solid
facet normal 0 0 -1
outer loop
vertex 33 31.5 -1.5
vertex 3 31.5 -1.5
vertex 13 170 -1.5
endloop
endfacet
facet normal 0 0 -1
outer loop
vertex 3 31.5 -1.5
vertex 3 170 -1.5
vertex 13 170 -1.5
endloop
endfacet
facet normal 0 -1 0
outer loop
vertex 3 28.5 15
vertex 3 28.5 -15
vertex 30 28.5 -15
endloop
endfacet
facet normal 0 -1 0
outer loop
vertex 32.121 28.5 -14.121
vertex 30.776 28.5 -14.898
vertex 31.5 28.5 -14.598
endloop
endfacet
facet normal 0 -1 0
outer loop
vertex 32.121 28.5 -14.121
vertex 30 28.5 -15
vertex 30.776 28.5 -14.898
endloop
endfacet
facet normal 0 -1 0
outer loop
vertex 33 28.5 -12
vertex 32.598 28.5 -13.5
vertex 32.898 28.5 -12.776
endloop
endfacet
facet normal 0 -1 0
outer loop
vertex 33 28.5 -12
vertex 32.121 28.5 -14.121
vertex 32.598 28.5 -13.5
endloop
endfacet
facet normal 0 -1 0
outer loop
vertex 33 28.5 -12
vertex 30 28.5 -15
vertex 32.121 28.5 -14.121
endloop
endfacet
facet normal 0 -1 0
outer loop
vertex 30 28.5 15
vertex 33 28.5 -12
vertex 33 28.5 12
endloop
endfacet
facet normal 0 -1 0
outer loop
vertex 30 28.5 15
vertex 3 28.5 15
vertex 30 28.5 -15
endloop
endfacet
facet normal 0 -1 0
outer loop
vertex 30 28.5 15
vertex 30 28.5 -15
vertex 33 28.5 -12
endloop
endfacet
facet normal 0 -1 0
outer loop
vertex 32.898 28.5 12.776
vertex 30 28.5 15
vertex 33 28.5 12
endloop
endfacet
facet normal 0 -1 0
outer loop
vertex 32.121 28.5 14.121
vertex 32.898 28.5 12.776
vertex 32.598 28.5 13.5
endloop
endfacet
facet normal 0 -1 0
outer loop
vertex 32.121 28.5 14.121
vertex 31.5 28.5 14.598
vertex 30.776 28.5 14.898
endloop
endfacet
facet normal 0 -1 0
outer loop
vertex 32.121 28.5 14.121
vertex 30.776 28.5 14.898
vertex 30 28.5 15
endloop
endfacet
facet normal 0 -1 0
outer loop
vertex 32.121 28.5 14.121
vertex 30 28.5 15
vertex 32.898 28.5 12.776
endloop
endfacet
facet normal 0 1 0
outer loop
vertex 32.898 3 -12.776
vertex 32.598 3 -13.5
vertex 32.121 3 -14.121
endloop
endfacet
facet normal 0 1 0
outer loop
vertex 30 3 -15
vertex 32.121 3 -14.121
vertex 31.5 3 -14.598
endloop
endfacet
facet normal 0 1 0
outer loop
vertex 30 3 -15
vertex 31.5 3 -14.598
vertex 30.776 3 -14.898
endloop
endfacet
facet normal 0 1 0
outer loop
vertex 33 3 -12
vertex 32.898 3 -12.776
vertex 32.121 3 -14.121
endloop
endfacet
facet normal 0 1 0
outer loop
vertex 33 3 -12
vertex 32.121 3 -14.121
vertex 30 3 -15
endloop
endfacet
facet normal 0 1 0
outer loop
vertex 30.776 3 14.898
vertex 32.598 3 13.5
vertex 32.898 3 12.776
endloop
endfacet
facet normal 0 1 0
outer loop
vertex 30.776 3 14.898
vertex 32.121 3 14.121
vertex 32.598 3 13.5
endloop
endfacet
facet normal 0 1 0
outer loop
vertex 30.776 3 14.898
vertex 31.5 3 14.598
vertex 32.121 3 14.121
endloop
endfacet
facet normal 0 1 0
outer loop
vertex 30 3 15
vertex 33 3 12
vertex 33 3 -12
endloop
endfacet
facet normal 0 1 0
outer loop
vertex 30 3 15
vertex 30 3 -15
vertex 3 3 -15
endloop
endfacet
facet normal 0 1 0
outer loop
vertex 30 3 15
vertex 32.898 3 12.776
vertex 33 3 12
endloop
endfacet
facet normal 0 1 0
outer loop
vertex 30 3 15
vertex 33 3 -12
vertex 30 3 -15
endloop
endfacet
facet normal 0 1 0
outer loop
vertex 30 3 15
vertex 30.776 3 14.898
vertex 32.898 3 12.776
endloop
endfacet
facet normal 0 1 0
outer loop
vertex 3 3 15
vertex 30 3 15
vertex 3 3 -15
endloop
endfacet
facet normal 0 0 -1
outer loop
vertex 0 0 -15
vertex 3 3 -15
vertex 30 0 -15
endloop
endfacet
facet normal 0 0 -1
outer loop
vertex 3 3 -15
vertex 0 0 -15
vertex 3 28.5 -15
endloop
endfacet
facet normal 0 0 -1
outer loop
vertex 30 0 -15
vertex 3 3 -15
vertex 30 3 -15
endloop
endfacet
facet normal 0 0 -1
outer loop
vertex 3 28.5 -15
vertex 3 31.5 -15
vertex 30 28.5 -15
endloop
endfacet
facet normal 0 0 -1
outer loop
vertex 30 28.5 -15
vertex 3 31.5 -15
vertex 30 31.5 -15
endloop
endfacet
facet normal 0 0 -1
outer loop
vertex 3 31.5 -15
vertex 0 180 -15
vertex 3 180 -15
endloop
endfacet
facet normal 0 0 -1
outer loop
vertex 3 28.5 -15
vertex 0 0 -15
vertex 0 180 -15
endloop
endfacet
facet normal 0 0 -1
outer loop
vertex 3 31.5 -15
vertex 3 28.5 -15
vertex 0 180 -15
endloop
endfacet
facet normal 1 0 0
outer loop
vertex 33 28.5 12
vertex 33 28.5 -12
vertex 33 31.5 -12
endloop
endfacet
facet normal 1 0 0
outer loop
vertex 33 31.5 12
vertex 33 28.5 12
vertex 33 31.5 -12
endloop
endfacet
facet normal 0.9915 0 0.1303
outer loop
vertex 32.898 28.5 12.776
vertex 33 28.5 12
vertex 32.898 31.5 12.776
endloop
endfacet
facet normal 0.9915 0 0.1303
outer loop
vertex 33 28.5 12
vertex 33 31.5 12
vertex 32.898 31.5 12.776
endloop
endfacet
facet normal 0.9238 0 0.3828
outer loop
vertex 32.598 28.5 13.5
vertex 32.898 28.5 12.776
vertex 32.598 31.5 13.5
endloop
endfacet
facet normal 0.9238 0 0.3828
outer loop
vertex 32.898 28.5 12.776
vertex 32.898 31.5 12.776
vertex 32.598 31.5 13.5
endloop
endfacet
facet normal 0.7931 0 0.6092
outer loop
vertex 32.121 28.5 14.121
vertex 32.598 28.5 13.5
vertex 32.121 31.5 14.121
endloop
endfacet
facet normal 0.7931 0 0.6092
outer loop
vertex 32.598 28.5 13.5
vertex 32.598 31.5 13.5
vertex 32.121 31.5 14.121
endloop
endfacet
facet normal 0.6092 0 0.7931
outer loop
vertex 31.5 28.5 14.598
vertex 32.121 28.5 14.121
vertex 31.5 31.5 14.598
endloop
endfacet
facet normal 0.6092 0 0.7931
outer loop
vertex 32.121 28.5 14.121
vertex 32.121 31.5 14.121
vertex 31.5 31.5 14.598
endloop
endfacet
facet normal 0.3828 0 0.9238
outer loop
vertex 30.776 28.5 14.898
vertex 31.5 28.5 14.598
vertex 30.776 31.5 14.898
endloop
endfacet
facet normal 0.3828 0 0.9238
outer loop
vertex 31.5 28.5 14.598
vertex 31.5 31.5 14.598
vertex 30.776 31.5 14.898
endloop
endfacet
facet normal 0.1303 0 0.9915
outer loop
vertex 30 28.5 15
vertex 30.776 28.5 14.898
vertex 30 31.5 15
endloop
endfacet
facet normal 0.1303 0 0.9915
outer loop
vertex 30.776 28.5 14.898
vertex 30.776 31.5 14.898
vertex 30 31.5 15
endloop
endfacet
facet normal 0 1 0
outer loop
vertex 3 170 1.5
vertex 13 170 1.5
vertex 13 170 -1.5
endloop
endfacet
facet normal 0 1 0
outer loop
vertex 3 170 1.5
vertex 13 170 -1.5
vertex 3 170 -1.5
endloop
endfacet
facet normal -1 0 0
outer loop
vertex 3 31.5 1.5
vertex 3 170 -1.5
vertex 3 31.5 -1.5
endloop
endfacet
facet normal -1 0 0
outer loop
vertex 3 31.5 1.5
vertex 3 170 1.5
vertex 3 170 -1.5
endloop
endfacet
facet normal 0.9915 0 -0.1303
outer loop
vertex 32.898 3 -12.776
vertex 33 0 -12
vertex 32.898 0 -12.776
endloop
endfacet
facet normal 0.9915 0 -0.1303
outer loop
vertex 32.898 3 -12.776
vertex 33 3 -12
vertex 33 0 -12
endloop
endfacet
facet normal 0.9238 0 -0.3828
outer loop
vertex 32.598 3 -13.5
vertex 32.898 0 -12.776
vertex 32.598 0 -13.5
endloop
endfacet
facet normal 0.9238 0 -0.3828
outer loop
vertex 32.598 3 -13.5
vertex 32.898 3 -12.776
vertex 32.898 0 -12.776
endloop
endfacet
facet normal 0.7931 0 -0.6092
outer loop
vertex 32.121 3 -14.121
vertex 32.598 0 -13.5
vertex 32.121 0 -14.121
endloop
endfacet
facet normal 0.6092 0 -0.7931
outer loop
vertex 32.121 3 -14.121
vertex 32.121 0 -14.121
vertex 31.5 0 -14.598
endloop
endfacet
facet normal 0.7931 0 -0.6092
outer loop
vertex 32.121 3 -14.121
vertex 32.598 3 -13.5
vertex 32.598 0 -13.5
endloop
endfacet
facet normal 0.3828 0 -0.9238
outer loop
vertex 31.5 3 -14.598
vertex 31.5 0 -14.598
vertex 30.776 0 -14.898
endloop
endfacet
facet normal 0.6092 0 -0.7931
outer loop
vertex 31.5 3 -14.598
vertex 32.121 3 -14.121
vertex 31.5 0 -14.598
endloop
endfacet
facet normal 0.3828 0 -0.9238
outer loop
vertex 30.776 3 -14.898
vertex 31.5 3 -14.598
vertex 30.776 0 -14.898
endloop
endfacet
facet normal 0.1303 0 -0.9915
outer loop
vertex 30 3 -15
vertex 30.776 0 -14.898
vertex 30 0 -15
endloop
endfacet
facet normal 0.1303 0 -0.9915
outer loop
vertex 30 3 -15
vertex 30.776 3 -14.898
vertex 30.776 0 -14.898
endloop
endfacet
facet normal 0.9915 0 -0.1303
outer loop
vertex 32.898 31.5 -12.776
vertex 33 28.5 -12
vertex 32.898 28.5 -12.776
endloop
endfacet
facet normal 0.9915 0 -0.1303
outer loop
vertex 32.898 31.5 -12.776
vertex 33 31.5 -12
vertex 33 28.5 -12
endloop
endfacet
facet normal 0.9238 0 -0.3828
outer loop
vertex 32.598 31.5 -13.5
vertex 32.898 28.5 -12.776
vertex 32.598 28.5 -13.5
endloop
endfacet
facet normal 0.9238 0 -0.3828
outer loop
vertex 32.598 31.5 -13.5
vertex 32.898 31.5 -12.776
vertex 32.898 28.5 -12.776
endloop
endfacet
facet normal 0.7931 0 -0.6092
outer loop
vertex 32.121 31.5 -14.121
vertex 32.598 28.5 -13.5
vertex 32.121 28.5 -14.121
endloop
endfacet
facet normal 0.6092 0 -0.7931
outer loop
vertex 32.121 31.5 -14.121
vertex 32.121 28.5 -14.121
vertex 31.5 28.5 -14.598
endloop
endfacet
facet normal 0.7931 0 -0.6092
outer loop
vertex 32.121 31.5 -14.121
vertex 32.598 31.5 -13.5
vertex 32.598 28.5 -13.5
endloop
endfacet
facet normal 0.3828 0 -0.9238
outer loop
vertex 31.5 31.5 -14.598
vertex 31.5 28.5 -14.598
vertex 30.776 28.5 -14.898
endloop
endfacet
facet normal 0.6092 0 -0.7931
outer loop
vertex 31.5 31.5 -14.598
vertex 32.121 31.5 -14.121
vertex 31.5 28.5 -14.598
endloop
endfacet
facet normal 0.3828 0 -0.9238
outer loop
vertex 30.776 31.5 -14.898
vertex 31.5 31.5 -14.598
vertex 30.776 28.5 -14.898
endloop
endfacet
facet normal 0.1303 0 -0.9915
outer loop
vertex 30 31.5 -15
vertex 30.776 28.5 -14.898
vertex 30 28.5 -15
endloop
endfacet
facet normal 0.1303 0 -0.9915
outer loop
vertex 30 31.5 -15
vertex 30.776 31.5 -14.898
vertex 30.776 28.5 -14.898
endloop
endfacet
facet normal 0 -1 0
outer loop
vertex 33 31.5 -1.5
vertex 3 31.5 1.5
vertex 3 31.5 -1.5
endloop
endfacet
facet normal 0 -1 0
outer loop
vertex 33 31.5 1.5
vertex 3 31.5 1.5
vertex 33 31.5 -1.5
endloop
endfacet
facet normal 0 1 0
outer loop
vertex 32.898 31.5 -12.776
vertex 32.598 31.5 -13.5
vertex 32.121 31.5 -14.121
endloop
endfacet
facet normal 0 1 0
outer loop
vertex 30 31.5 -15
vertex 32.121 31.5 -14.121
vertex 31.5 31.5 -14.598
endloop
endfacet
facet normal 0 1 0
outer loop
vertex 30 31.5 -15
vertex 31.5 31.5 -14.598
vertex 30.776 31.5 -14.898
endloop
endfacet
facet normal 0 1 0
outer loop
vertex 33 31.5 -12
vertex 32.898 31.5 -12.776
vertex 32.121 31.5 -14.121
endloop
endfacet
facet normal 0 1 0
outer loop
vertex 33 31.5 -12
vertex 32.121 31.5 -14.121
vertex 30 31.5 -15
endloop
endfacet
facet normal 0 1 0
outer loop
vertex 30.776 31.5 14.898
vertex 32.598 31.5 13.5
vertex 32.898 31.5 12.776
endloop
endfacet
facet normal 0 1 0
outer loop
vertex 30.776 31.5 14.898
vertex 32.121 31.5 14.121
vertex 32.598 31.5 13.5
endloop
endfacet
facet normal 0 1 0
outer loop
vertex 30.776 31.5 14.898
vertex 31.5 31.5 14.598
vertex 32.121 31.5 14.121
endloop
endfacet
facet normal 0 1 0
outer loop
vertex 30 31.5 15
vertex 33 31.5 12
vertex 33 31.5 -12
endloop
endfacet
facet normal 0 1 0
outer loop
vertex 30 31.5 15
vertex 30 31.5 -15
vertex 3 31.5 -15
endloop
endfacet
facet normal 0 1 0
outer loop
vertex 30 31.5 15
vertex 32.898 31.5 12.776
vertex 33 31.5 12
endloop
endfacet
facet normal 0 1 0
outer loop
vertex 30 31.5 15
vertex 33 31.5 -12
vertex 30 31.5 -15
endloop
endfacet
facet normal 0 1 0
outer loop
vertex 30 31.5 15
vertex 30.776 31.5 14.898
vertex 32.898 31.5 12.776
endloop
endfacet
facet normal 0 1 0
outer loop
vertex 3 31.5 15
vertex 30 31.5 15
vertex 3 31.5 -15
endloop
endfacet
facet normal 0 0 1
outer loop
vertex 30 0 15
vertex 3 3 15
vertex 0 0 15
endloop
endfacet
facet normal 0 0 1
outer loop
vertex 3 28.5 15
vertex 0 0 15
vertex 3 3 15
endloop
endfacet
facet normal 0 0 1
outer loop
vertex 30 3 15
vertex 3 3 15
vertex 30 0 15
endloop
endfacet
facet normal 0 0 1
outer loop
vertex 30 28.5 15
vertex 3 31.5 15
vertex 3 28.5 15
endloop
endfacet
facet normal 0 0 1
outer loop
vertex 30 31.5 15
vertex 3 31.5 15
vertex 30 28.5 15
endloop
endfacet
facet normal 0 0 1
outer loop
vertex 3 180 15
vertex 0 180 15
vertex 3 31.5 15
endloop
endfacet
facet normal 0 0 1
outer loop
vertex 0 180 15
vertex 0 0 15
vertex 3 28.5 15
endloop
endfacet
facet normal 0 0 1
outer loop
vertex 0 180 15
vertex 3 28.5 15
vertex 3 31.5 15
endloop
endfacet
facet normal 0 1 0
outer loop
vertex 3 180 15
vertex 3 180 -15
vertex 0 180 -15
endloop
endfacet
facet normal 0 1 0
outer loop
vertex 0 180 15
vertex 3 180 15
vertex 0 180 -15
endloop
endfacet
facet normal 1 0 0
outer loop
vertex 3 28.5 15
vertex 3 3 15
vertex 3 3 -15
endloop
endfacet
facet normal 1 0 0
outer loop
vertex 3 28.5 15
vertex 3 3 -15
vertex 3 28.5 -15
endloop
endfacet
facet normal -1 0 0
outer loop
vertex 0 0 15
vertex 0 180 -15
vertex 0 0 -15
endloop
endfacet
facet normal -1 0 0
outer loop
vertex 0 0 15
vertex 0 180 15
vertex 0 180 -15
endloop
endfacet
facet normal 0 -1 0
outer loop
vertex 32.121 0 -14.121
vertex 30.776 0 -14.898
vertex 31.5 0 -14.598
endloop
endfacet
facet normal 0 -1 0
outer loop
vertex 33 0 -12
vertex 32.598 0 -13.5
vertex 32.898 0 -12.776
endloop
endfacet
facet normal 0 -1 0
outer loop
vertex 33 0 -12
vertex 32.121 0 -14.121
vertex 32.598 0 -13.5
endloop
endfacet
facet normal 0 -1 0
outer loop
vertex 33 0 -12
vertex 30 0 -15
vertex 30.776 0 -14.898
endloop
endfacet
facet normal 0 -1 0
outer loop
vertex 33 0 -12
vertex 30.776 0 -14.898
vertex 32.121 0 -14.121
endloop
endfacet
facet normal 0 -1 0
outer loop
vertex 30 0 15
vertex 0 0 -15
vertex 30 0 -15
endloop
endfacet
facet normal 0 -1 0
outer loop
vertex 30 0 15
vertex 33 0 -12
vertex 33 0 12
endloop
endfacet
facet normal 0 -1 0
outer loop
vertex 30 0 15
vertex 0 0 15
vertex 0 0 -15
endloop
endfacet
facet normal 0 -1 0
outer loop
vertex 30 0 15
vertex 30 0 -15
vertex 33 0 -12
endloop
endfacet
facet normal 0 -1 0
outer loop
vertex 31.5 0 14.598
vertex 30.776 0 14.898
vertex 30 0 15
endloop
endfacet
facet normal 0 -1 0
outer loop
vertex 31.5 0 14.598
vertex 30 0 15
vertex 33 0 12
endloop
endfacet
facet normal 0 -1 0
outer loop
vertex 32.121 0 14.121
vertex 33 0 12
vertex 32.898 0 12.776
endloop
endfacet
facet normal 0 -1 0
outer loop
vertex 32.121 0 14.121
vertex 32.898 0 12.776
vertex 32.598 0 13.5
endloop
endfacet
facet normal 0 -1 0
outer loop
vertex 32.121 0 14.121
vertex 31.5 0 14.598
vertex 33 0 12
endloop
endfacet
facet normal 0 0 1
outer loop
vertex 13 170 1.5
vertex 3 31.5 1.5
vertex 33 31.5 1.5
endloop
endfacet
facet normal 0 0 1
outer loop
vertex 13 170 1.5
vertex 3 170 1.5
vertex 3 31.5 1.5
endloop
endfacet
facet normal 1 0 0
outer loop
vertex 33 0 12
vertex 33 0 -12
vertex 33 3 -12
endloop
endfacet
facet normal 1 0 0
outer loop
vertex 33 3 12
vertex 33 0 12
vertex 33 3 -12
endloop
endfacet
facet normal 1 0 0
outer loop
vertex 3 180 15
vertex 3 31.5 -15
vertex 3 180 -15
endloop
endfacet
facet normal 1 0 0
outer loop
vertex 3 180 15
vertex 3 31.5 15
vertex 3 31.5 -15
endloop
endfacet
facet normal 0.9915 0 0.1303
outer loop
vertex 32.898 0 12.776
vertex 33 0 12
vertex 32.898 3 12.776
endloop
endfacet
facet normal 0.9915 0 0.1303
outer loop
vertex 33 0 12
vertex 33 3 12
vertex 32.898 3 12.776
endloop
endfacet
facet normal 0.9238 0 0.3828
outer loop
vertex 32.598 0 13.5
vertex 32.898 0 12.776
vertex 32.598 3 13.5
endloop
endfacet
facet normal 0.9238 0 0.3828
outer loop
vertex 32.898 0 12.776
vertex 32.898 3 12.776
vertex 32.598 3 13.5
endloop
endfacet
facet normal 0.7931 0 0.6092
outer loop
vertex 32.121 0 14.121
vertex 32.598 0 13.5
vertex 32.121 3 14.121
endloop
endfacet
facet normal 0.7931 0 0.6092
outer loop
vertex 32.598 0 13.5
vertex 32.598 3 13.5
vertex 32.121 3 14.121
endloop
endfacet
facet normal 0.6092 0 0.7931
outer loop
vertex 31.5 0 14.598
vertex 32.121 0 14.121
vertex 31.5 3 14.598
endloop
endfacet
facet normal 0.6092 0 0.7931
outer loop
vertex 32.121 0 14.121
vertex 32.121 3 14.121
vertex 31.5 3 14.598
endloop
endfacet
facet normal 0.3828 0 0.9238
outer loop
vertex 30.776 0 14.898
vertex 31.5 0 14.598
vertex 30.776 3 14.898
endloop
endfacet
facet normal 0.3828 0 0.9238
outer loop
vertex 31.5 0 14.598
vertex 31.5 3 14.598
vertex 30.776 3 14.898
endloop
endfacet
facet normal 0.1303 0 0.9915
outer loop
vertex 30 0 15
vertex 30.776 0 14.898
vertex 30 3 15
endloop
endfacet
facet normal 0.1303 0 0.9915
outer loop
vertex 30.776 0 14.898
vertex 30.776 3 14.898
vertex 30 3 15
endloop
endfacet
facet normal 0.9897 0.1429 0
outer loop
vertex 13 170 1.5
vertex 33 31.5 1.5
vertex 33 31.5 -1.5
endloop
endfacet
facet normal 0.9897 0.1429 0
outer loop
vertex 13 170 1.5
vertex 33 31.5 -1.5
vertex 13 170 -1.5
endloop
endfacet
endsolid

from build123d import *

# Parameters (mm, degrees)
F1_DEPTH = 15
F3_DEPTH = 1.5
F4_R     = 3


with BuildPart() as f1:
    # F0 (on Top) → F1 (new body, symmetric)
    with BuildSketch(Plane.XY):
        Polygon((0, 180), (0, 0), (33, 0), (33, 3), (3, 3), (3, 28.5), (33, 28.5), (33, 31.5), (3, 31.5), (3, 180), align=None)
    extrude(amount=F1_DEPTH, both=True)

    # F4
    f4_edges = [f1.edges().sort_by_distance(p)[0] for p in [
        (33, 30, 15),
        (33, 1.5, 15),
        (33, 30, -15),
        (33, 1.5, -15),
    ]]
    fillet(f4_edges, radius=F4_R)


with BuildPart() as f3:
    # F2 (on Top) → F3 (new body, symmetric)
    with BuildSketch(Plane.XY):
        Polygon((3, 31.5), (33, 31.5), (13, 170), (3, 170), align=None)
    extrude(amount=F3_DEPTH, both=True)


solid = Compound([f1.part, f3.part])
